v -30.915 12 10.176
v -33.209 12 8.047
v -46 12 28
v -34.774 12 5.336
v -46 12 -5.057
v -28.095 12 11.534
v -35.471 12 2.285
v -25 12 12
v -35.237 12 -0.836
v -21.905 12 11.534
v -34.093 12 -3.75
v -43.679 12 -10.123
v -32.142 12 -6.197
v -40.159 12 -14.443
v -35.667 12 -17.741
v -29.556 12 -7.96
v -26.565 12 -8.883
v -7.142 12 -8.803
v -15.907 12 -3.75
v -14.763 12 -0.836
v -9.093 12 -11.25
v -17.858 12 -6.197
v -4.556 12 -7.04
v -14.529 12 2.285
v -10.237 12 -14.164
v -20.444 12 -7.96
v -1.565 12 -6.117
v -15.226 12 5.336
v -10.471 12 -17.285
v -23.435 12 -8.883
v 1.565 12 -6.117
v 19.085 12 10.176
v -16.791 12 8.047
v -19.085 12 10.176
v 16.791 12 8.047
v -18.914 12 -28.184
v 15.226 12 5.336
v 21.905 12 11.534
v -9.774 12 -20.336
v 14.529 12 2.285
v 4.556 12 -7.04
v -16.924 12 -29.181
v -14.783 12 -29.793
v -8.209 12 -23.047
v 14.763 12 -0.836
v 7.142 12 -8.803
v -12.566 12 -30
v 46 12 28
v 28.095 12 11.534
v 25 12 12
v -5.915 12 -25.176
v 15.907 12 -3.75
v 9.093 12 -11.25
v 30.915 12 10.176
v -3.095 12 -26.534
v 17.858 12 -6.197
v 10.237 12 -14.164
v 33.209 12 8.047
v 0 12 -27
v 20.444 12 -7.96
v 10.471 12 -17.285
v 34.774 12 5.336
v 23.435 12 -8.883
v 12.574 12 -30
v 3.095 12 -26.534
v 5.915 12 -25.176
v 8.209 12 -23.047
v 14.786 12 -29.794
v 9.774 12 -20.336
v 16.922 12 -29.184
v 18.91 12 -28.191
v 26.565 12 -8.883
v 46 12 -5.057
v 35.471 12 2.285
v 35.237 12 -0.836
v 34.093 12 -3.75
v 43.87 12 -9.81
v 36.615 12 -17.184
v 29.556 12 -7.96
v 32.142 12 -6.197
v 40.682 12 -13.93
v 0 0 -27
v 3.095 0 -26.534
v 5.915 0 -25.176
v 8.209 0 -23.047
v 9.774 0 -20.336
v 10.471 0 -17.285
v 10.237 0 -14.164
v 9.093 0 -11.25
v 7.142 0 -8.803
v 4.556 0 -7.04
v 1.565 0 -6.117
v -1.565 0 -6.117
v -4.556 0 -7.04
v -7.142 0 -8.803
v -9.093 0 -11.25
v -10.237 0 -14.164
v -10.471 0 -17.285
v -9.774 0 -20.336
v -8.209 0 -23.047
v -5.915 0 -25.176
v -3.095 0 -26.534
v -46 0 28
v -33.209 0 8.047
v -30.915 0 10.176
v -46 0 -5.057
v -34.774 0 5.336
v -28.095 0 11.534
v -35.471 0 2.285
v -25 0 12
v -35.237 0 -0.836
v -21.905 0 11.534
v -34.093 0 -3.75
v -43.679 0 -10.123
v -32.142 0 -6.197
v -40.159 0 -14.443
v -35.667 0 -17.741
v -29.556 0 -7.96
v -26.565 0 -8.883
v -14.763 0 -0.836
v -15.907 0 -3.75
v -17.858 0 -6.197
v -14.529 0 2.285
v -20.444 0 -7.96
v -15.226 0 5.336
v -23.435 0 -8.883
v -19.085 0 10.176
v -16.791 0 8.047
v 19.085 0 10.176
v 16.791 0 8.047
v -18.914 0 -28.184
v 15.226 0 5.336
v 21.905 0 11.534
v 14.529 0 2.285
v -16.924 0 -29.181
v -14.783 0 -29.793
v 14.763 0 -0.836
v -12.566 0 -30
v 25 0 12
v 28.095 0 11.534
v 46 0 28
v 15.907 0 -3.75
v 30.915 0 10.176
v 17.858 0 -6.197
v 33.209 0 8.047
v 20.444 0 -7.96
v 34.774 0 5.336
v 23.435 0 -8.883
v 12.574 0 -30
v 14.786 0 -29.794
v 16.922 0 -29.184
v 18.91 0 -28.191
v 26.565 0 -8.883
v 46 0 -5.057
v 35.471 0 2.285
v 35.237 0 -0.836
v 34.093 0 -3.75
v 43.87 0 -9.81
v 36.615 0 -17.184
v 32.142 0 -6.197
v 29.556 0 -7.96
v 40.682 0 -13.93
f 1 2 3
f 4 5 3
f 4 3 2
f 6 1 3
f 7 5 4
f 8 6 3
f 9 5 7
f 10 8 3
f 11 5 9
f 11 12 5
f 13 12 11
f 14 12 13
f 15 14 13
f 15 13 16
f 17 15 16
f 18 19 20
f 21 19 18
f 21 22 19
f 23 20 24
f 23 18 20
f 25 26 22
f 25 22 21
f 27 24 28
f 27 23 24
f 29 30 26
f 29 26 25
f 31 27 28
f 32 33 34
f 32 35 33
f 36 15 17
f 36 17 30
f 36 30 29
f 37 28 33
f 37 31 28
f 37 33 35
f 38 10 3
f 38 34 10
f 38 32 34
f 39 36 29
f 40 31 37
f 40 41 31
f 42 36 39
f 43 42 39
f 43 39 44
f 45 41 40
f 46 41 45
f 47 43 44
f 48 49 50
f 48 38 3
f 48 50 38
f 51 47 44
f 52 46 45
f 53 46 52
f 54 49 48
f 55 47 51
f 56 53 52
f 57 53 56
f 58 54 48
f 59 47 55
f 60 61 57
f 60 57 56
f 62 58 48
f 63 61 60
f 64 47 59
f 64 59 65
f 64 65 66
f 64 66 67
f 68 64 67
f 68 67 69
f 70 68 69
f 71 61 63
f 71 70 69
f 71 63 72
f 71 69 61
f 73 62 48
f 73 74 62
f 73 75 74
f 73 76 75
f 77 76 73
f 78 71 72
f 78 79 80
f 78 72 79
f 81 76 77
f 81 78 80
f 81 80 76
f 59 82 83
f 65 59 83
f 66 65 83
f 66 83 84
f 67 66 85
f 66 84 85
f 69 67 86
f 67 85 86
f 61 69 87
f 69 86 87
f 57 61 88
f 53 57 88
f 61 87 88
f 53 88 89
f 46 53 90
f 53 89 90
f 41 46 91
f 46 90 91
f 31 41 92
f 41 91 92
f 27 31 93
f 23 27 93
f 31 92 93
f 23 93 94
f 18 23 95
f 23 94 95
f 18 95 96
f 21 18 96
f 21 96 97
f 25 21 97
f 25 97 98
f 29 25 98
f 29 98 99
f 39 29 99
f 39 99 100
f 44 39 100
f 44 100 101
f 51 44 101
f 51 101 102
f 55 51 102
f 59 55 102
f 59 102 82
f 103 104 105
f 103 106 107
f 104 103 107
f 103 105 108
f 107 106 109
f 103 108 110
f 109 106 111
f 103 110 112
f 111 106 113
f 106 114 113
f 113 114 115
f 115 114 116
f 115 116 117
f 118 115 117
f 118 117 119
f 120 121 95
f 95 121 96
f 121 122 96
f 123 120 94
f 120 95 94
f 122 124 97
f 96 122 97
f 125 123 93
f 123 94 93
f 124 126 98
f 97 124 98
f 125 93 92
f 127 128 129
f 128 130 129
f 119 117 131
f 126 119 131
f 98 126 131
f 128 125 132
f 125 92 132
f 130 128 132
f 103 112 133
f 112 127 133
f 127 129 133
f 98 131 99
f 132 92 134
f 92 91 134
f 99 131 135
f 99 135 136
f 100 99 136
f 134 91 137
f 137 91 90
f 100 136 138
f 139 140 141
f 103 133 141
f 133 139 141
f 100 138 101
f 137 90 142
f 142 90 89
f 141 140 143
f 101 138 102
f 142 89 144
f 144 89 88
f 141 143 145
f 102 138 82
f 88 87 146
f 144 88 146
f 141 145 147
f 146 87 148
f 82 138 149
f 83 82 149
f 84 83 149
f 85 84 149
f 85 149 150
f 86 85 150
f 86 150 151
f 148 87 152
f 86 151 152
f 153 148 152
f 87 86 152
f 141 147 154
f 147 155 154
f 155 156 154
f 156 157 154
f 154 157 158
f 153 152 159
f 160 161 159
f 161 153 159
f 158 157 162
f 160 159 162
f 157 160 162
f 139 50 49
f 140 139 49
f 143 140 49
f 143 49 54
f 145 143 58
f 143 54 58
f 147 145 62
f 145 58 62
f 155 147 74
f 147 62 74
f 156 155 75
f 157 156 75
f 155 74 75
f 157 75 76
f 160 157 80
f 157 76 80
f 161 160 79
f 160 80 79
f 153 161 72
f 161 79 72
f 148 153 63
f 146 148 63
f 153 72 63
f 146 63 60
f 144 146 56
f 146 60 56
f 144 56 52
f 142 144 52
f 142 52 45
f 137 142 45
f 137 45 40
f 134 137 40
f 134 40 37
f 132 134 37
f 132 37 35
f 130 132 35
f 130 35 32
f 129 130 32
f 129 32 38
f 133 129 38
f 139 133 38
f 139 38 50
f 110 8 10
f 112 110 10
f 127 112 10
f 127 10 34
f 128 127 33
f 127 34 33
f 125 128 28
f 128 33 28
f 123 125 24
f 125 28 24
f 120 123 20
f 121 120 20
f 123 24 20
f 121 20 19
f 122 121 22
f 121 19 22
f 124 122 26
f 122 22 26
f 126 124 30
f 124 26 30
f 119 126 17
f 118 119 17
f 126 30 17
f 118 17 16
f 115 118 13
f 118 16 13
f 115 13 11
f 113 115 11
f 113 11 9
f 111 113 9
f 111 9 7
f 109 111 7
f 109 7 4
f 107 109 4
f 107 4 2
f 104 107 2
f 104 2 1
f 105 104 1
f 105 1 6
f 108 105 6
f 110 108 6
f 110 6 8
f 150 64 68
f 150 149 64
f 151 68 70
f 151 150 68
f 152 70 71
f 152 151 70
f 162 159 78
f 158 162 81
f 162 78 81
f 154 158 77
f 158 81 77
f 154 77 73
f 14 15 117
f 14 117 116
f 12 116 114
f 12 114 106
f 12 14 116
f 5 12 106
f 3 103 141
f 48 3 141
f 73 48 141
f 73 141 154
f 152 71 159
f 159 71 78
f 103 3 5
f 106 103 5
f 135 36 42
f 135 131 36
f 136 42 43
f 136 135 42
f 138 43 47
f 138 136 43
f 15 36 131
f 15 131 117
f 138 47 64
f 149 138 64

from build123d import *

# Parameters (mm, degrees)
SKETCH1_W           = 92
SKETCH1_H           = 56
BOSS_EXTRUDE1_DEPTH = 12
SKETCH8_W           = 92
SKETCH8_H           = 2
BOSS_EXTRUDE3_DEPTH = 12
CUT_EXTRUDE1_REACH  = 58.214
SKETCH2_R           = 10.5
CUT_EXTRUDE5_REACH  = 58.214
FILLET2_R           = 12
CUT_EXTRUDE7_REACH  = 58.214
SKETCH12_R          = 10.5


with BuildPart() as part:
    # Sketch1 → Boss-Extrude1 (new body)
    with BuildSketch(Plane(origin=(0, 0, 0), x_dir=(1, 0, 0), z_dir=(0, 1, 0))):
        Rectangle(SKETCH1_W, SKETCH1_H)
    extrude(amount=BOSS_EXTRUDE1_DEPTH)

    # Sketch8 → Boss-Extrude3 (add)
    with BuildSketch(Plane(origin=(0, 12, 0), x_dir=(1, 0, 0), z_dir=(0, 1, 0))):
        with Locations((0, 29)):
            Rectangle(SKETCH8_W, SKETCH8_H)
    extrude(amount=-BOSS_EXTRUDE3_DEPTH)

    # Sketch2 → Cut-Extrude1 (cut, up to next)
    with BuildSketch(Plane(origin=(0, 12, 0), x_dir=(1, 0, 0), z_dir=(0, 1, 0)), mode=Mode.PRIVATE) as cut_extrude1_sk1:
        with Locations(Location((-25, -1.5, 0), (0, 0, 270))):
            Circle(SKETCH2_R)
    cut_extrude1_tool1 = extrude(cut_extrude1_sk1.sketch, amount=-CUT_EXTRUDE1_REACH, mode=Mode.PRIVATE) & part.part
    # Sketch2 → Cut-Extrude1 (cut, up to next)
    with BuildSketch(Plane(origin=(0, 12, 0), x_dir=(1, 0, 0), z_dir=(0, 1, 0)), mode=Mode.PRIVATE) as cut_extrude1_sk2:
        with Locations(Location((25, -1.5, 0), (0, 0, 270))):
            Circle(SKETCH2_R)
    cut_extrude1_tool2 = extrude(cut_extrude1_sk2.sketch, amount=-CUT_EXTRUDE1_REACH, mode=Mode.PRIVATE) & part.part
    add(cut_extrude1_tool1.solids().sort_by_distance((-25, 12, 1.5))[0], mode=Mode.SUBTRACT)
    add(cut_extrude1_tool2.solids().sort_by_distance((25, 12, 1.5))[0], mode=Mode.SUBTRACT)

    # Sketch10 → Cut-Extrude5 (cut, up to next)
    with BuildSketch(Plane(origin=(0, 12, 0), x_dir=(1, 0, 0), z_dir=(0, 1, 0)), mode=Mode.PRIVATE) as cut_extrude5_sk1:
        with BuildLine():
            Line((-46, 5.057438524), (-46, 30))
            Line((-46, 30), (-16, 30))
            Line((-16, 30), (-35.667304108, 17.740806196))
            ThreePointArc((-35.667304108, 17.740806196), (-42.056420822, 12.395269294), (-46, 5.057438524))
        make_face()
    cut_extrude5_tool1 = extrude(cut_extrude5_sk1.sketch, amount=-CUT_EXTRUDE5_REACH, mode=Mode.PRIVATE) & part.part
    # Sketch10 → Cut-Extrude5 (cut, up to next)
    with BuildSketch(Plane(origin=(0, 12, 0), x_dir=(1, 0, 0), z_dir=(0, 1, 0)), mode=Mode.PRIVATE) as cut_extrude5_sk2:
        with BuildLine():
            Line((46, 5.057438524), (46, 30))
            Line((46, 30), (16, 30))
            Line((16, 30), (36.615382461, 17.183760068))
            ThreePointArc((36.615382461, 17.183760068), (42.39835371, 11.964668142), (46, 5.057438524))
        make_face()
    cut_extrude5_tool2 = extrude(cut_extrude5_sk2.sketch, amount=-CUT_EXTRUDE5_REACH, mode=Mode.PRIVATE) & part.part
    add(cut_extrude5_tool1.solids().sort_by_distance((-36.403407, 12, -23.114901))[0], mode=Mode.SUBTRACT)
    add(cut_extrude5_tool2.solids().sort_by_distance((36.411287, 12, -23.11647))[0], mode=Mode.SUBTRACT)

    # Fillet2
    fillet2_edges = [part.edges().sort_by_distance(p)[0] for p in [
        (-16, 6, -30),
        (16, 6, -30),
    ]]
    fillet(fillet2_edges, radius=FILLET2_R)

    # Sketch12 → Cut-Extrude7 (cut, up to next)
    with BuildSketch(Plane.XZ, mode=Mode.PRIVATE) as cut_extrude7_sk1:
        with Locations(Location((0, -16.5, 0), (0, 0, 270))):
            Circle(SKETCH12_R)
    cut_extrude7_tool1 = extrude(cut_extrude7_sk1.sketch, amount=-CUT_EXTRUDE7_REACH, mode=Mode.PRIVATE) & part.part
    add(cut_extrude7_tool1.solids().sort_by_distance((0, 0, -16.5))[0], mode=Mode.SUBTRACT)


solid = part.part
